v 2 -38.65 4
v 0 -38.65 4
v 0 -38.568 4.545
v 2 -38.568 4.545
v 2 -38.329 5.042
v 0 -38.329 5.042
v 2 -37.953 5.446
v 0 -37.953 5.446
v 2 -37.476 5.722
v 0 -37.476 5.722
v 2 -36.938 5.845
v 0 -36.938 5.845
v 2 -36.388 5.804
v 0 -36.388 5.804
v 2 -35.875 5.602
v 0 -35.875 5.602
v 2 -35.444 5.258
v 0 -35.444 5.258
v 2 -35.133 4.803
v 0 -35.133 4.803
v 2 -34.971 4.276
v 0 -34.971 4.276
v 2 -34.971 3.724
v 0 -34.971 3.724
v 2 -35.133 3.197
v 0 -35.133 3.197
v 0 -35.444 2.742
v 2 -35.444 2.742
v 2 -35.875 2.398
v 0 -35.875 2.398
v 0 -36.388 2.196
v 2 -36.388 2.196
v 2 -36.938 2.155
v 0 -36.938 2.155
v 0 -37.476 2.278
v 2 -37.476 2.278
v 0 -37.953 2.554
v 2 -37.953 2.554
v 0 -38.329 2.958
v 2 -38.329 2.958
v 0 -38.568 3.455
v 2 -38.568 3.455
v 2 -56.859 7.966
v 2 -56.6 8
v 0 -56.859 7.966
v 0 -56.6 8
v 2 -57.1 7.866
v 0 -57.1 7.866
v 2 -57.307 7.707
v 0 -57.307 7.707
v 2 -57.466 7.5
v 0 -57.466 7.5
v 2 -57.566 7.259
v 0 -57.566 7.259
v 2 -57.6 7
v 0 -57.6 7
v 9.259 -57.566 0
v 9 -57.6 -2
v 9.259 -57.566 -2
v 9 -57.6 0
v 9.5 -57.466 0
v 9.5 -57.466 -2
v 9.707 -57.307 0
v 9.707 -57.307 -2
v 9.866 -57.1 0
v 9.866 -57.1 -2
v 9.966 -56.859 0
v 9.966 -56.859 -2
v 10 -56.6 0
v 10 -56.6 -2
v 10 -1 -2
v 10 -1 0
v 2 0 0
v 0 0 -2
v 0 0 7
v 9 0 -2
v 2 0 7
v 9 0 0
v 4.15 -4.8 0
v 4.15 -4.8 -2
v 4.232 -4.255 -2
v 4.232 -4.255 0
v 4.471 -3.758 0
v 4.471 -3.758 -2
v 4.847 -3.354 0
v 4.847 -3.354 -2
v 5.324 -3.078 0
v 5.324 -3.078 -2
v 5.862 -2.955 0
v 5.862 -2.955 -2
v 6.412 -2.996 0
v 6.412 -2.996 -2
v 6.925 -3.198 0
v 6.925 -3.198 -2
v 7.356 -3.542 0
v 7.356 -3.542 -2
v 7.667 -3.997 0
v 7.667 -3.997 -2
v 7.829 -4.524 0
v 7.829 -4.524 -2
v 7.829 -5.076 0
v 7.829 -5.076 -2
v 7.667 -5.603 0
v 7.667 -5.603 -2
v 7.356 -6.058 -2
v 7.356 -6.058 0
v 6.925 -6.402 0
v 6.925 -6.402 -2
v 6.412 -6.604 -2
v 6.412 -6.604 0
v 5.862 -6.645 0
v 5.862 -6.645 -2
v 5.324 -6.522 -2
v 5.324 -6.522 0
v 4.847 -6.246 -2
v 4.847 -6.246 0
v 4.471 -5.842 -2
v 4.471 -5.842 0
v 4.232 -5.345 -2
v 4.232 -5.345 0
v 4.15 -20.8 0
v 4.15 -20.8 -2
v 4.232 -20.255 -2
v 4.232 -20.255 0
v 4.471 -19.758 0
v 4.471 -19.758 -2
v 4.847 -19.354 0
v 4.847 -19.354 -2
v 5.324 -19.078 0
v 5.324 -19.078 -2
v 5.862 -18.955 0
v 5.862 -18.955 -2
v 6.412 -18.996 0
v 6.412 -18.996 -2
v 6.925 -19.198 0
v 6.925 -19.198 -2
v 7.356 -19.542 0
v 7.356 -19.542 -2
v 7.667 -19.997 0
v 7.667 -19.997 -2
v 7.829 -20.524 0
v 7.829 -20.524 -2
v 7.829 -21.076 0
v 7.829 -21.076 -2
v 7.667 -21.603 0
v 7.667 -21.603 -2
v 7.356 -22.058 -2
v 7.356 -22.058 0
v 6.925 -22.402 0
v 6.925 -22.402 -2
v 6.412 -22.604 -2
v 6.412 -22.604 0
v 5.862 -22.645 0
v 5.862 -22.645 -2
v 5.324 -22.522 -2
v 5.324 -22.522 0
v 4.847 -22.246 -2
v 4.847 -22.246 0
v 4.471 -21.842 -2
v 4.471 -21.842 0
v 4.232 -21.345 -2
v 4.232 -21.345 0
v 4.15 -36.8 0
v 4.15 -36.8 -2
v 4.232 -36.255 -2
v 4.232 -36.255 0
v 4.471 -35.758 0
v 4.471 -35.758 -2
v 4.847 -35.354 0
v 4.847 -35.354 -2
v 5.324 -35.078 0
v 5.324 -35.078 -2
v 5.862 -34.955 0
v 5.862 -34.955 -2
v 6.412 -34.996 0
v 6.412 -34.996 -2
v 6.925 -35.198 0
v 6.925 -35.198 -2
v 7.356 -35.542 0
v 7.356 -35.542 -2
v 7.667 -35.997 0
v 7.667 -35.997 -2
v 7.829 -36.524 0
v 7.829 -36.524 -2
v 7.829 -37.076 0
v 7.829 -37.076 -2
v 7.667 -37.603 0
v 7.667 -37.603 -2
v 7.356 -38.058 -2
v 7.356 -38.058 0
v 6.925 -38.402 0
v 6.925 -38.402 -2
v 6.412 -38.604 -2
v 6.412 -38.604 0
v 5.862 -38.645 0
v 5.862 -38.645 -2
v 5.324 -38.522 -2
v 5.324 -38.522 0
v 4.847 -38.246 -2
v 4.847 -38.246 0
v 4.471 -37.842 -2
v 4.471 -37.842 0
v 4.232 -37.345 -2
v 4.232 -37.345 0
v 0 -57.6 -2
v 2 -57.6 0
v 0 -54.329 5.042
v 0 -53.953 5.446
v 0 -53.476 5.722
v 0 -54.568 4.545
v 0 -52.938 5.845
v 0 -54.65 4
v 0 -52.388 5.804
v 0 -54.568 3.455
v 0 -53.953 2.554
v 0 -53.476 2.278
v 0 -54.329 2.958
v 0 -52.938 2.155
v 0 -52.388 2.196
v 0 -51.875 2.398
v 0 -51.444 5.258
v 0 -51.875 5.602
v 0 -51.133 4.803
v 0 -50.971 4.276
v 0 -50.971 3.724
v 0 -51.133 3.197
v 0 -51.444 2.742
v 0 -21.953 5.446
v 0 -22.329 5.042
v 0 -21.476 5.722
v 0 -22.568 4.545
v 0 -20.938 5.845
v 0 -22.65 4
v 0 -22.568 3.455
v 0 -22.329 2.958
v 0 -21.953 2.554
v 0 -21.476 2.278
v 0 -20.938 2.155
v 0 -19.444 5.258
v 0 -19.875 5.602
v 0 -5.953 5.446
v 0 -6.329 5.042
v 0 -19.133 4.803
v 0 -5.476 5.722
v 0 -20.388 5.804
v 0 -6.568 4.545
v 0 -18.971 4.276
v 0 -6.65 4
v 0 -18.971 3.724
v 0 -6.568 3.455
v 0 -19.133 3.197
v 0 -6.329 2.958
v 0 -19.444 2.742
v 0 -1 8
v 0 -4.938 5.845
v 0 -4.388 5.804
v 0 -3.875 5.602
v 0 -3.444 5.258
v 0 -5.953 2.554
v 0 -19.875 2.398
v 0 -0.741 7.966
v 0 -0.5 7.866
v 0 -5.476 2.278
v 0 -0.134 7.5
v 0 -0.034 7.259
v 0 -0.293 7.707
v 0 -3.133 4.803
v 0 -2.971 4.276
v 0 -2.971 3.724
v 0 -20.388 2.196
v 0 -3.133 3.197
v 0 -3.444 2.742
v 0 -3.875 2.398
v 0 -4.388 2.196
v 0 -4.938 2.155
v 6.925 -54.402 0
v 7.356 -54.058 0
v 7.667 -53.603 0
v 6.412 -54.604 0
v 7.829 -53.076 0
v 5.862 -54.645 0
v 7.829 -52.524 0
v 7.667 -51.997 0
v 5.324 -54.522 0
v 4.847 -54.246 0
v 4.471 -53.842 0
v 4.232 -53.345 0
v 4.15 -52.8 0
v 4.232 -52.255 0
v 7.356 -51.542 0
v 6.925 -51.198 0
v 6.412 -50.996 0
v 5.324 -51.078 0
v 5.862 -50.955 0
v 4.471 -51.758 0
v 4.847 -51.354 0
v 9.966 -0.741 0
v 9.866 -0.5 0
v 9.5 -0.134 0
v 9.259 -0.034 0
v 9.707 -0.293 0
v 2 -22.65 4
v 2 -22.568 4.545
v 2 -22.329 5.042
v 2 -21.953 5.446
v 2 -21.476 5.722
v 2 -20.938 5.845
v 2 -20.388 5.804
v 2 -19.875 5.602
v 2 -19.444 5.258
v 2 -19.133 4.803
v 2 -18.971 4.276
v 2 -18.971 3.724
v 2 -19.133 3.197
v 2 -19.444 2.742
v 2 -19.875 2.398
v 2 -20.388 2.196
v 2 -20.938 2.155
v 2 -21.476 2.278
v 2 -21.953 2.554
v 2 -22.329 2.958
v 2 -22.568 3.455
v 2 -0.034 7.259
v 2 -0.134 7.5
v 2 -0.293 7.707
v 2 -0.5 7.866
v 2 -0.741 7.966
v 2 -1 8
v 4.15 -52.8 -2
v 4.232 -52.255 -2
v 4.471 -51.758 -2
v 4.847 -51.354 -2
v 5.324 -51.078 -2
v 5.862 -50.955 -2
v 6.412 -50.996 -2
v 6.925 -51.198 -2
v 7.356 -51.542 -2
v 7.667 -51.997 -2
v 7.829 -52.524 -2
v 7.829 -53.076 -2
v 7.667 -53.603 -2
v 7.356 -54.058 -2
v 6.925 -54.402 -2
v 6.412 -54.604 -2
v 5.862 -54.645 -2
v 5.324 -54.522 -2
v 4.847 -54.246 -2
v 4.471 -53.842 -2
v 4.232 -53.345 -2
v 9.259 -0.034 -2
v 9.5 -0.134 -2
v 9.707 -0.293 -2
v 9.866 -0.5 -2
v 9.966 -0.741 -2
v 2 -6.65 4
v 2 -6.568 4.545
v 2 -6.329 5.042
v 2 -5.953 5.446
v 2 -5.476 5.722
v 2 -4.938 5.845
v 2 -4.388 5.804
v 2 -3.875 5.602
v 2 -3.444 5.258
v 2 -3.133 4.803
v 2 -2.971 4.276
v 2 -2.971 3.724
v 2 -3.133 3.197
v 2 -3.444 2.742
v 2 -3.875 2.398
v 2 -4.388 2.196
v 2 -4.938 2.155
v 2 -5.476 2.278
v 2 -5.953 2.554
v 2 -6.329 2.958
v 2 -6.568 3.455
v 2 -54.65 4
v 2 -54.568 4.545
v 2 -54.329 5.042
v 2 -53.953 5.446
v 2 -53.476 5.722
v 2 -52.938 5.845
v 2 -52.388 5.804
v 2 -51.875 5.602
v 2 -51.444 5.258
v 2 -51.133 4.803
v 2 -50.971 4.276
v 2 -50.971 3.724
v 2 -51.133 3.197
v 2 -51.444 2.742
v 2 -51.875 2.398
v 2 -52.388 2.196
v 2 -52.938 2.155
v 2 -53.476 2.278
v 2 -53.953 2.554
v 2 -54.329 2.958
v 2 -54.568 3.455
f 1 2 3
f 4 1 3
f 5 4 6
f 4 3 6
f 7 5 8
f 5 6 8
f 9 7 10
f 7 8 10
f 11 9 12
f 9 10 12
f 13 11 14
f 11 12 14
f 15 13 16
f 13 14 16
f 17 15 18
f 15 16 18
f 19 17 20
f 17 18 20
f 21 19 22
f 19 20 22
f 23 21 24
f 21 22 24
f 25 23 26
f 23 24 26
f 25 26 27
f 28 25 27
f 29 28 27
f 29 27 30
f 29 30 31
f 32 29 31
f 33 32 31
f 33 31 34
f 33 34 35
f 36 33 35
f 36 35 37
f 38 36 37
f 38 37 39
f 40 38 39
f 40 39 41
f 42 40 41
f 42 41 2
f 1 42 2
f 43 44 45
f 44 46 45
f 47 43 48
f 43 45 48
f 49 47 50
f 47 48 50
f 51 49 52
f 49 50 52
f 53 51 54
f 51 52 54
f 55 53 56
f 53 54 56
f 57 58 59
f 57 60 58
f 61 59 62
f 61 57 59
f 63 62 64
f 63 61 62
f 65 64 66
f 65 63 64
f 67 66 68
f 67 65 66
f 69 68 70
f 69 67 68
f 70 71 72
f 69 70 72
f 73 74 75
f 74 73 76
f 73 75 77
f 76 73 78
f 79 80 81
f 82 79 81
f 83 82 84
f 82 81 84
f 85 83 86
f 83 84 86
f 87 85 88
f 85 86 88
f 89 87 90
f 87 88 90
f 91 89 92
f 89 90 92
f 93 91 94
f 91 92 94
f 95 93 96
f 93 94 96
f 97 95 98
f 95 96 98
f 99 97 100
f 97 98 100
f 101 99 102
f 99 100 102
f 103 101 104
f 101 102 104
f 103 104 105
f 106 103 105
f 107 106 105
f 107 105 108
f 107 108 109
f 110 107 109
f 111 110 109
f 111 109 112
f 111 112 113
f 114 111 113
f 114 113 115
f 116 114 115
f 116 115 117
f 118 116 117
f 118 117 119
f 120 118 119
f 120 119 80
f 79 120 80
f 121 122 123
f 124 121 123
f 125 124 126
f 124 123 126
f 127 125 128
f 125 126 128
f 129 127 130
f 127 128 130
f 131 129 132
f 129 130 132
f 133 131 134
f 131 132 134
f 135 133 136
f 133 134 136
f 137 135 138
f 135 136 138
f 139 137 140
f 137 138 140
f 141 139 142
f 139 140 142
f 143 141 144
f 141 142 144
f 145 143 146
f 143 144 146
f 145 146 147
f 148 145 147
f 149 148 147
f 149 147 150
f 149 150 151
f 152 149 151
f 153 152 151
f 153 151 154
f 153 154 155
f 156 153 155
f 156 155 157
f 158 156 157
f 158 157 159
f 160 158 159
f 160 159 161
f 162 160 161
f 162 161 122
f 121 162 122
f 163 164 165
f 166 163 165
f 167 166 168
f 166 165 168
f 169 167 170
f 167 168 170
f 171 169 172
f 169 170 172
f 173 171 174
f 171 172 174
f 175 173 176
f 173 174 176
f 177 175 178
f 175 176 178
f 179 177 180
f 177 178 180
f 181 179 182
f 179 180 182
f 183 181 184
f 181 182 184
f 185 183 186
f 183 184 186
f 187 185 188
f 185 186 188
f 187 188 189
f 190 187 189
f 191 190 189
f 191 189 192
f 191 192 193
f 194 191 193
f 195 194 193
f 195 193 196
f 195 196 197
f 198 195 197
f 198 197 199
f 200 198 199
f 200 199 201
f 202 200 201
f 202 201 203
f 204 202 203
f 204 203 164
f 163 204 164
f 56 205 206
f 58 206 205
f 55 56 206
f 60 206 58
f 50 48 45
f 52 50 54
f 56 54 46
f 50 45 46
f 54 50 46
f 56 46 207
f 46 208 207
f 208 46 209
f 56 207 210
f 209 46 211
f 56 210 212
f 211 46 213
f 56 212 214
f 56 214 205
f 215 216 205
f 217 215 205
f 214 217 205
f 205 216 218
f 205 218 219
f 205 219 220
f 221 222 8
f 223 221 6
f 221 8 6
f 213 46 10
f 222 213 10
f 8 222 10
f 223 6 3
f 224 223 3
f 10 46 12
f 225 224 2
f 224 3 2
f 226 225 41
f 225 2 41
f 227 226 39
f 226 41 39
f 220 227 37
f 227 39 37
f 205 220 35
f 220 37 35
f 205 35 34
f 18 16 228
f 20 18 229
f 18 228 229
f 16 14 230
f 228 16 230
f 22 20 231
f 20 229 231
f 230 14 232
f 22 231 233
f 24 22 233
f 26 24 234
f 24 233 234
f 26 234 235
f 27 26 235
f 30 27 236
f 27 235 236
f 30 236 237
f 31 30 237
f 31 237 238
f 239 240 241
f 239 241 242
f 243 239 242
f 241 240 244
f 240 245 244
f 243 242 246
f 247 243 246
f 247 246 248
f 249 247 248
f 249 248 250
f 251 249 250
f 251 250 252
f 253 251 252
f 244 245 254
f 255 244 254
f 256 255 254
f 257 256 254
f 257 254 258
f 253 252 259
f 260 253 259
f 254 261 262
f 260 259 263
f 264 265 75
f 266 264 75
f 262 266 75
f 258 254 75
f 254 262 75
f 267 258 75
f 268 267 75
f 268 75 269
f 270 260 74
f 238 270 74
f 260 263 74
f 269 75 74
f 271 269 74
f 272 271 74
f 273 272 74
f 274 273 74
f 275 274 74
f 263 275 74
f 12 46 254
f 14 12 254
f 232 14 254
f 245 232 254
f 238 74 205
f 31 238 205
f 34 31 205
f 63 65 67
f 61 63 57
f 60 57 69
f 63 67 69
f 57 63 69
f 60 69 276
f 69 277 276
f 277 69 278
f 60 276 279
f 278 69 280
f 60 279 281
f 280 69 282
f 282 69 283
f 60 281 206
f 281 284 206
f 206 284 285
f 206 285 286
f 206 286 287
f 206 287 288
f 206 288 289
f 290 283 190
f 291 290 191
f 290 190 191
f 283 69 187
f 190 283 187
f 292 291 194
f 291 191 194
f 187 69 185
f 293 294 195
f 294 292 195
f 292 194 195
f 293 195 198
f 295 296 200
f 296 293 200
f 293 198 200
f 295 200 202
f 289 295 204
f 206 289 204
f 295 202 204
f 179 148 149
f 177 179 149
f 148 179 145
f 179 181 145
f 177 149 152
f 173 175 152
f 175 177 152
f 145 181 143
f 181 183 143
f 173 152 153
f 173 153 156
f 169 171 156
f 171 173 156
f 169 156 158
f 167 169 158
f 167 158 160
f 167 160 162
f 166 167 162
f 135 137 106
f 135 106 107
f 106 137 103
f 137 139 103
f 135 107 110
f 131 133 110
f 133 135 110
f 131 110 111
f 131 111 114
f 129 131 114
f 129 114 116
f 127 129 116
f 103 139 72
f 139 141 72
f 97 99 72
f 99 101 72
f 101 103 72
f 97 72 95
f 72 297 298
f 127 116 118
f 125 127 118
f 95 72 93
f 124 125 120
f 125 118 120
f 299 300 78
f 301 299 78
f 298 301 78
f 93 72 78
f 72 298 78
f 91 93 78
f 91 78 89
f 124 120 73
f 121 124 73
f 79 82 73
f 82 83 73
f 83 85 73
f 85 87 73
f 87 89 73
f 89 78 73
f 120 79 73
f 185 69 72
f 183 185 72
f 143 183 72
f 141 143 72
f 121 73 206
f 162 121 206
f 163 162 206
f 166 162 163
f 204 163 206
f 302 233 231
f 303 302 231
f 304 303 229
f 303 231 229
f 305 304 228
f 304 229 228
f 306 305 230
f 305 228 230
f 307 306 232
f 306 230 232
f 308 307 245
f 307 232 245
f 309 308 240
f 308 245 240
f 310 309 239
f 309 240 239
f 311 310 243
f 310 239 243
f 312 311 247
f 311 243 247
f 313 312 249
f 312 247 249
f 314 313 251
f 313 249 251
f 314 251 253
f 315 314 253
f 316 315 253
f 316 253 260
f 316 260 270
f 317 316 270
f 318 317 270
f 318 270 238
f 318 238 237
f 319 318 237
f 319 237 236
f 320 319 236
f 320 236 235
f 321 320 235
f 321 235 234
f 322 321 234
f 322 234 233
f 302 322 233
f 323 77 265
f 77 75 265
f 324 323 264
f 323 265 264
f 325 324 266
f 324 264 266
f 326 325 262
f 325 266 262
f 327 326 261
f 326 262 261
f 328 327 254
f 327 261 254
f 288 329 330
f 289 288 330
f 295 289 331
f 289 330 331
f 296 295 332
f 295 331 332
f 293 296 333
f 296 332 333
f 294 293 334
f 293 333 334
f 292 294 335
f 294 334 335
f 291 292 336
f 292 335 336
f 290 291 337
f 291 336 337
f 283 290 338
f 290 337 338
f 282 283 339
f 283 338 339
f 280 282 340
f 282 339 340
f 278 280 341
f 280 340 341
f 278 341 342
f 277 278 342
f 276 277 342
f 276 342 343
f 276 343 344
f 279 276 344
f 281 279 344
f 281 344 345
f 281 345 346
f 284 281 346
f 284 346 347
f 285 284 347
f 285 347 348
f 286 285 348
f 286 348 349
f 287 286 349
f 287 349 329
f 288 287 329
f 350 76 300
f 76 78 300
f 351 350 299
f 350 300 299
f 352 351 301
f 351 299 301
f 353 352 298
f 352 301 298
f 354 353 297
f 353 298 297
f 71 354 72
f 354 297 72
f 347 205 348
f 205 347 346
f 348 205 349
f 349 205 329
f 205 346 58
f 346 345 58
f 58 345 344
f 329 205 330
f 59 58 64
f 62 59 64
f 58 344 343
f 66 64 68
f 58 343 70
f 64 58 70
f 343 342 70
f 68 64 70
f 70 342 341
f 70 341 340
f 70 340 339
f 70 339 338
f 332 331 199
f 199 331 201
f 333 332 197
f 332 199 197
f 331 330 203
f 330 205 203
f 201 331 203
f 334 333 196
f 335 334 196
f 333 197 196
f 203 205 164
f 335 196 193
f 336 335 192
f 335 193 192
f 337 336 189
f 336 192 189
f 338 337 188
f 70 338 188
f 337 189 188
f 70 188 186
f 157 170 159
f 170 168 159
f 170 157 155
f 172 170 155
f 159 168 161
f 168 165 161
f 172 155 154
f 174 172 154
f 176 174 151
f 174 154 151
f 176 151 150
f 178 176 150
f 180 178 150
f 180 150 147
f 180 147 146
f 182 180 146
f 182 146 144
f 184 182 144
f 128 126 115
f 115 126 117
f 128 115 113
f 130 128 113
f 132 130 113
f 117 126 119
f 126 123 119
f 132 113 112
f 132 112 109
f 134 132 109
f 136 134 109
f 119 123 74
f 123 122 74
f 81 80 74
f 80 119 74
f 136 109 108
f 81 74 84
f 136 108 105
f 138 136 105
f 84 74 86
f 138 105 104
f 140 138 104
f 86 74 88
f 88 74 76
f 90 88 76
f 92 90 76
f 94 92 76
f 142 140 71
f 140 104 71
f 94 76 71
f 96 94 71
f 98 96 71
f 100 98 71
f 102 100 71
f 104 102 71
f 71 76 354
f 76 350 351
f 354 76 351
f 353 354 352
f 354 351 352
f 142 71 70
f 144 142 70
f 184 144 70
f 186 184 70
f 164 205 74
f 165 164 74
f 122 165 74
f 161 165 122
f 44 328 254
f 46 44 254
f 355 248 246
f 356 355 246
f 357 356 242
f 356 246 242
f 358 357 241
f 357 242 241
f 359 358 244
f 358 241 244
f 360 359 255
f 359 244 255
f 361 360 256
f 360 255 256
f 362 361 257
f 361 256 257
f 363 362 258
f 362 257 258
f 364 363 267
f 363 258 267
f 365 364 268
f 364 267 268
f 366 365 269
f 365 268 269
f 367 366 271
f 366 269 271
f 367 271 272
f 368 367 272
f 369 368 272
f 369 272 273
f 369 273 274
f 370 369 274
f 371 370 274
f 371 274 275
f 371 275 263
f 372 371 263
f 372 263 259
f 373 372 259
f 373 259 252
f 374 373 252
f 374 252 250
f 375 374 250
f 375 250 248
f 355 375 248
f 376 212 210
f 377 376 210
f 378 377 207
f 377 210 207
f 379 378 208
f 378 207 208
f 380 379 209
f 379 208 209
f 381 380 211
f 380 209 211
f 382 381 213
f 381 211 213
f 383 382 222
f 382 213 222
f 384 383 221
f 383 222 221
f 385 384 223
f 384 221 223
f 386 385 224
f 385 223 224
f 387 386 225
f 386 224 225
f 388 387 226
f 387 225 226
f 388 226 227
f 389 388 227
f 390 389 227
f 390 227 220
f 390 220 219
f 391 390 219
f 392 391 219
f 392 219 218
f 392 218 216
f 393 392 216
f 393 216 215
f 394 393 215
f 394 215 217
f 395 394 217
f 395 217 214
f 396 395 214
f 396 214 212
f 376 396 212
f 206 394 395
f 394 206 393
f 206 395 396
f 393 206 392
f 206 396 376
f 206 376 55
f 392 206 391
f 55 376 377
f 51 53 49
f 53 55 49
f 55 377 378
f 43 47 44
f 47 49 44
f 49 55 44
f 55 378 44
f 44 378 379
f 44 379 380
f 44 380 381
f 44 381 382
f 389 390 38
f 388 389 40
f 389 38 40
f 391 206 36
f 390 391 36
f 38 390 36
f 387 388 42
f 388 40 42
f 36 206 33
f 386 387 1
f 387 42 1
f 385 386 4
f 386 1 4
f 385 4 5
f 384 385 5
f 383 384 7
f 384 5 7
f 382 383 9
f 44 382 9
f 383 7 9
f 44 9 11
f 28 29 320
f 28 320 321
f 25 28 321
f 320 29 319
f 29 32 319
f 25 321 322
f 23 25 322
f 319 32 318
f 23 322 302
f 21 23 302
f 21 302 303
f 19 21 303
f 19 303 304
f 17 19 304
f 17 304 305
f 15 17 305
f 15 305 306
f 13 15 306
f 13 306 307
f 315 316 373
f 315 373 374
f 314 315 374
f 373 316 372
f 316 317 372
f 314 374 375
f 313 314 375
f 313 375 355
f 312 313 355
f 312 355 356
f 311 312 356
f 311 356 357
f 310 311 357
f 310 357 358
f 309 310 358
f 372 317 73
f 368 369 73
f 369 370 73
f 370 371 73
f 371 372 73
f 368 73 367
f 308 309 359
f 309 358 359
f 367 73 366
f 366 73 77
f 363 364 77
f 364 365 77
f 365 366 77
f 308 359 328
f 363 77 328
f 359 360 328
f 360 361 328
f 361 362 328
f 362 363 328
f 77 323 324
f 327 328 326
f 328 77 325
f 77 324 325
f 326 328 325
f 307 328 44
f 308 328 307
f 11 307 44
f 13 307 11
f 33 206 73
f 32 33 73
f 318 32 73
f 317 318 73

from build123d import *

# Parameters (mm, degrees)
F1_DEPTH = 57.6
F2_R     = 1
F3_R     = 1
F4_R     = 1
F5_R     = 1
F7_D     = 3.7
F9_D     = 3.7


with BuildPart() as f1:
    # F0 (on Front) → F1 (new body)
    with BuildSketch(Plane.XZ):
        Polygon((2, 8), (0, 8), (0, -2), (10, -2), (10, 0), (2, 0), align=None)
    extrude(amount=F1_DEPTH)

    # F2
    f2_edges = [f1.edges().sort_by_distance(p)[0] for p in [
        (1, -57.6, 8),
    ]]
    fillet(f2_edges, radius=F2_R)

    # F3
    f3_edges = [f1.edges().sort_by_distance(p)[0] for p in [
        (10, -57.6, -1),
    ]]
    fillet(f3_edges, radius=F3_R)

    # F4
    f4_edges = [f1.edges().sort_by_distance(p)[0] for p in [
        (1, 0, 8),
    ]]
    fillet(f4_edges, radius=F4_R)

    # F5
    f5_edges = [f1.edges().sort_by_distance(p)[0] for p in [
        (10, 0, -1),
    ]]
    fillet(f5_edges, radius=F5_R)

    # F7 (through all)
    with Locations(Plane.XY):
        with Locations((6, -52.8), (6, -36.8), (6, -20.8), (6, -4.8)):
            Hole(F7_D / 2)

    # F9 (through all)
    with Locations(Plane.YZ.offset(2)):
        with Locations((-52.8, 4), (-36.8, 4), (-20.8, 4), (-4.8, 4)):
            Hole(F9_D / 2)


solid = f1.part
